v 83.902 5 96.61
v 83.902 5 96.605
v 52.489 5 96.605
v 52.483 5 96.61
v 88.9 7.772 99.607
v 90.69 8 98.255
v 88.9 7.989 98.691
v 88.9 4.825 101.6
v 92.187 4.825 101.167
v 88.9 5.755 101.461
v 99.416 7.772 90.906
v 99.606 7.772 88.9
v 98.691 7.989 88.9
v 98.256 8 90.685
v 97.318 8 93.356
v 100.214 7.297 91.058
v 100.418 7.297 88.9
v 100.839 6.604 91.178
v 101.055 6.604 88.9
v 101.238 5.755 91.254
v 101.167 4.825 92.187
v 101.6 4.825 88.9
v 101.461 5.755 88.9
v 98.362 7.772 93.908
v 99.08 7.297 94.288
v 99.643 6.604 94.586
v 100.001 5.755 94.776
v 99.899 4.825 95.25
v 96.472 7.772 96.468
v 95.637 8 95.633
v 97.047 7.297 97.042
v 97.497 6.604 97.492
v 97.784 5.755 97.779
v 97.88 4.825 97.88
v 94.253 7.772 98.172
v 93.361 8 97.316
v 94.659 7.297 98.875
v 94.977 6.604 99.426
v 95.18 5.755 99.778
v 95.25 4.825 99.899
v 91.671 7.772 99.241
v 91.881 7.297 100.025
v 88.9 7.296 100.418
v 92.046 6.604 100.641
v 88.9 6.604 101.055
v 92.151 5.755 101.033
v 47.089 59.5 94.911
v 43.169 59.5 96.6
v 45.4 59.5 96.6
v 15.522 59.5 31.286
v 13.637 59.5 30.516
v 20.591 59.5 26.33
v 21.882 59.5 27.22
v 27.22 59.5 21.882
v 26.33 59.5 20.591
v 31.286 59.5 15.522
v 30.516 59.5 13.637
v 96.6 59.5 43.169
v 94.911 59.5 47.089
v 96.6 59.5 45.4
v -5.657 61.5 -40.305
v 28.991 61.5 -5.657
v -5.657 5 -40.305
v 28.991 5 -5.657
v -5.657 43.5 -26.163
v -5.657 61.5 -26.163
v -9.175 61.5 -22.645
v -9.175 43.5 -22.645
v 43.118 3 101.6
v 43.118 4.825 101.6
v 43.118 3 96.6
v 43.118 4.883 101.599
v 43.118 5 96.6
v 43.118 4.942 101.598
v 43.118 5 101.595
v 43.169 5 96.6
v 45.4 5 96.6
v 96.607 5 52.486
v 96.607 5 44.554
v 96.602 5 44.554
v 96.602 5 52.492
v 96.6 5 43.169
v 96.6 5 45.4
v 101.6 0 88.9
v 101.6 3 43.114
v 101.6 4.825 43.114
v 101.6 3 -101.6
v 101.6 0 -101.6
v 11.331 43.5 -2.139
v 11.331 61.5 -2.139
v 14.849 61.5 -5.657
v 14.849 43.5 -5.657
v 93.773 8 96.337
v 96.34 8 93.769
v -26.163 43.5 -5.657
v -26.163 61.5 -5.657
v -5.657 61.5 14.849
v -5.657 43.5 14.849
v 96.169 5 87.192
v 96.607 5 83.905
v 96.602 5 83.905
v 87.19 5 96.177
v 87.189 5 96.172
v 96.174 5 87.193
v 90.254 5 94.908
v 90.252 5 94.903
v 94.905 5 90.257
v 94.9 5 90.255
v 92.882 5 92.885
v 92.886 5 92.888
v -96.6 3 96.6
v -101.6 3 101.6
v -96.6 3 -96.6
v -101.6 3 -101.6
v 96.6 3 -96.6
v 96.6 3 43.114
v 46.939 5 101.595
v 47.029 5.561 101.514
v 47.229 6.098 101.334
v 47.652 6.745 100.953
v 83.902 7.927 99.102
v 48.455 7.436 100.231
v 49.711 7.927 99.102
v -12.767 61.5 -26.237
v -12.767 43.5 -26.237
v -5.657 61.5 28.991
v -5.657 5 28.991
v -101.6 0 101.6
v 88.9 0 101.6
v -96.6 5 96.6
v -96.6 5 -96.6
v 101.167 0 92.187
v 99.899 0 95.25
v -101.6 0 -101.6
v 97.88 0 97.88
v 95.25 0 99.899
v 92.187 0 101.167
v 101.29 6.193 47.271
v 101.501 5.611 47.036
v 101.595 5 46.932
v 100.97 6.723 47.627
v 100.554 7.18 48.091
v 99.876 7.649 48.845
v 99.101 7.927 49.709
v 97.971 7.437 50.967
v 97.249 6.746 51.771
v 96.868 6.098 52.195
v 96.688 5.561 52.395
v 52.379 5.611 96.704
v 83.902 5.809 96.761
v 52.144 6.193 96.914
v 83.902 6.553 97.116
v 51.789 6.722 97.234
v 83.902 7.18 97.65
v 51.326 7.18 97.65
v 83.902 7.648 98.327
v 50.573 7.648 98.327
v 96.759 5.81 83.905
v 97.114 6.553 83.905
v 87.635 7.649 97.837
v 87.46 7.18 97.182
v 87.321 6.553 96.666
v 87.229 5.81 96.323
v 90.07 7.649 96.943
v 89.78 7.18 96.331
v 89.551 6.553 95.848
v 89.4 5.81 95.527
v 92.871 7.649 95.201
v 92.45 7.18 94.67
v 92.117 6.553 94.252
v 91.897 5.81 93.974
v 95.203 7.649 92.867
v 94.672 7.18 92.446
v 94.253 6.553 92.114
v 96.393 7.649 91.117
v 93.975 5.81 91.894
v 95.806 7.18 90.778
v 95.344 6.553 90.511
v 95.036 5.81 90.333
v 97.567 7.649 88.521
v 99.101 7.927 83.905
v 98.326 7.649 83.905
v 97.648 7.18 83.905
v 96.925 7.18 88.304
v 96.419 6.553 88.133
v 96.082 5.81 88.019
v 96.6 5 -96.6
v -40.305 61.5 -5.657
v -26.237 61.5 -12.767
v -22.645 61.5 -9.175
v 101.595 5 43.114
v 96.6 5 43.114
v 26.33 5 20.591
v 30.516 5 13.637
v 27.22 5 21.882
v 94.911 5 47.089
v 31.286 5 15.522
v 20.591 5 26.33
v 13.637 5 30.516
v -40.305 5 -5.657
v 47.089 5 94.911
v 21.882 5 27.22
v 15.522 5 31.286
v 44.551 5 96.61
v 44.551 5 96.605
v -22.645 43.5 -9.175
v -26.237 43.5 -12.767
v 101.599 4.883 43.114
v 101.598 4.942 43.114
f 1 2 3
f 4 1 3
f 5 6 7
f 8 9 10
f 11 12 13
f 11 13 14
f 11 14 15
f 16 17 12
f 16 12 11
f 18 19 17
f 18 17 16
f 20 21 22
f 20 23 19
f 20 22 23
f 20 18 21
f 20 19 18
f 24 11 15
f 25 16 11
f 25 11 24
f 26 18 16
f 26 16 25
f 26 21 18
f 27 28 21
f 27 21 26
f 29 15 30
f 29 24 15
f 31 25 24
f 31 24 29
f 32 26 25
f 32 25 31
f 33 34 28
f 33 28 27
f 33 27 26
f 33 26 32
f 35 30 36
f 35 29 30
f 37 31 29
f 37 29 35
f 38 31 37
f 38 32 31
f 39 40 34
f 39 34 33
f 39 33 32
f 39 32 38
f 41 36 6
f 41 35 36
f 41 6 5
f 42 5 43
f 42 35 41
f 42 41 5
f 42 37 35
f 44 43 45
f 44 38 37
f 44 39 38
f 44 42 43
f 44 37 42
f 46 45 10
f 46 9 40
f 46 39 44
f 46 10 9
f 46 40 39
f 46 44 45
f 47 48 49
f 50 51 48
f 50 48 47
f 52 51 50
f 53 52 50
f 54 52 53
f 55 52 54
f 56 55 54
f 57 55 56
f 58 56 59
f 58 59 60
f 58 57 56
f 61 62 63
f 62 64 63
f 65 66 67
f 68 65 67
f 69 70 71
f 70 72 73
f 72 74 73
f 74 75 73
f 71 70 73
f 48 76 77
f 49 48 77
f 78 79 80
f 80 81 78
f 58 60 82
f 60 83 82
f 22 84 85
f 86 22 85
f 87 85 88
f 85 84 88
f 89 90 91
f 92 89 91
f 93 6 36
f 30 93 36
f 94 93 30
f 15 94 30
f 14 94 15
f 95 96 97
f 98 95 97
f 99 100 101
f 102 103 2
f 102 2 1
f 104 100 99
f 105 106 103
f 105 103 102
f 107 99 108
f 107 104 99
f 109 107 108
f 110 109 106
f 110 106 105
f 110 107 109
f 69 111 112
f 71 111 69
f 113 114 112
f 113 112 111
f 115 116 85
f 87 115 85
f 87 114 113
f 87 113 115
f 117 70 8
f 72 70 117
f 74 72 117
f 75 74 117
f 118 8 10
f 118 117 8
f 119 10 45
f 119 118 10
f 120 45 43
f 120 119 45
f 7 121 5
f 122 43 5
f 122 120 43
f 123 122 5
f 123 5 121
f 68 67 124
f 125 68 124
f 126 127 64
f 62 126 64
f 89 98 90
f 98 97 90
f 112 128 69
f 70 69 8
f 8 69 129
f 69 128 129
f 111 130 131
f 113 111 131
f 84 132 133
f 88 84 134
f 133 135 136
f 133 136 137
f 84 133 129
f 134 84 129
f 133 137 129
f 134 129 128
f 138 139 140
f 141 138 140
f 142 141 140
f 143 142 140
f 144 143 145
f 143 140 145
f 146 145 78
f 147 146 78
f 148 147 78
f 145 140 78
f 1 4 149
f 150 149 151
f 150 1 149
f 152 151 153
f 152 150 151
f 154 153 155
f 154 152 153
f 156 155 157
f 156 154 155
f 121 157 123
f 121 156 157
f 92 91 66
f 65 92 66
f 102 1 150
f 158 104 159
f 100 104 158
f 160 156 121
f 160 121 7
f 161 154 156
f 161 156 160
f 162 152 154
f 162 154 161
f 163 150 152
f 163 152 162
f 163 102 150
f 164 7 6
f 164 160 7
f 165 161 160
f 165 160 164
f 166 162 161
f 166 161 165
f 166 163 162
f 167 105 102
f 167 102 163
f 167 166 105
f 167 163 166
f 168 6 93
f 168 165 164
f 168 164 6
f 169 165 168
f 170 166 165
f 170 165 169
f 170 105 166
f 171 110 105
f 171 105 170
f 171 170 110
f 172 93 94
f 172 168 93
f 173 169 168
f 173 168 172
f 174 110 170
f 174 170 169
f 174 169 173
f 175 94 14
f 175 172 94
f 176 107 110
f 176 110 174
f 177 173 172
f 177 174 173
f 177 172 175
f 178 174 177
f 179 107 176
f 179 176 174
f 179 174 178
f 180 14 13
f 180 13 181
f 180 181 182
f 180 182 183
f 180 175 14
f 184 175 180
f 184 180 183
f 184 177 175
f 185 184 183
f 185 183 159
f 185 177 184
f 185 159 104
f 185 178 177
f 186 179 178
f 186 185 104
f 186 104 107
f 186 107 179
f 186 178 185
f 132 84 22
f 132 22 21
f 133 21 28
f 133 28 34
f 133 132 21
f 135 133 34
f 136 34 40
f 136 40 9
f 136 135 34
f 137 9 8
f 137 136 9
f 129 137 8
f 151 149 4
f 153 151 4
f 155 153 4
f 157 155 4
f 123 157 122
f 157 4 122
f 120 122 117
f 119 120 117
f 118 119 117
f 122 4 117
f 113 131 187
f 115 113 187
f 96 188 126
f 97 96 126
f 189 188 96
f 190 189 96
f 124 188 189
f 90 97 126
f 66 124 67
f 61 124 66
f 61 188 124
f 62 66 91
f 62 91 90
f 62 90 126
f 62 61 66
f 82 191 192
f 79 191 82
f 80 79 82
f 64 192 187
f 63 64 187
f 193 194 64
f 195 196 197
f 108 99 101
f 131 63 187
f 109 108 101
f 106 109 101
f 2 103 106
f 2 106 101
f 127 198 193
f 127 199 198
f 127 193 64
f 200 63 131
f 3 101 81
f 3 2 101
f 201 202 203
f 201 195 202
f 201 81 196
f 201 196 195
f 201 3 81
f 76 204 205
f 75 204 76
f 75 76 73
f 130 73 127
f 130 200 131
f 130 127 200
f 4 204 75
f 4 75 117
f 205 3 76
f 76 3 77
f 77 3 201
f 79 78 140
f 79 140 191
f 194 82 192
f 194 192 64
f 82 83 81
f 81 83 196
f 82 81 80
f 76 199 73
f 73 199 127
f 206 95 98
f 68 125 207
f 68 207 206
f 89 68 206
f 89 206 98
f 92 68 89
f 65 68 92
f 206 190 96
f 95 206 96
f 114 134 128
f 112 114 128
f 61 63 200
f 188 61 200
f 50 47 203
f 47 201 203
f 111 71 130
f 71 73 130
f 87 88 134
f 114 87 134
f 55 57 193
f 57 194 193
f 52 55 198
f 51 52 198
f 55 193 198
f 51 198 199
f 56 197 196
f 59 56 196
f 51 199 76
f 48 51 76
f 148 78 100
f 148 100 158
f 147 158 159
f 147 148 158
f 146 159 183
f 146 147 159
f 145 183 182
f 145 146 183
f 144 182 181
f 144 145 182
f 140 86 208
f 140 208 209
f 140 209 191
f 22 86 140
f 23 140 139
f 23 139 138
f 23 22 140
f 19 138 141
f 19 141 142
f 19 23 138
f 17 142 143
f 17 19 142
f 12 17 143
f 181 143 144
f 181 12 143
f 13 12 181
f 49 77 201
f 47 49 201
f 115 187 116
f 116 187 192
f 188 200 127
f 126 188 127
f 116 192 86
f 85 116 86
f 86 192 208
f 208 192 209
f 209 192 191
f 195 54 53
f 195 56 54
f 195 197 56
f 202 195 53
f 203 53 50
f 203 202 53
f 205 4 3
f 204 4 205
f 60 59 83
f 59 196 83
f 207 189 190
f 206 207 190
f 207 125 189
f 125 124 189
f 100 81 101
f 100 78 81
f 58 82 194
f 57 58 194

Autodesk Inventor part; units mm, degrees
ref_plane "YZ Plane" through (0, 0, 0) normal (1, 0, 0) x (0, 1, 0)
ref_plane "XZ Plane" through (0, 0, 0) normal (0, 1, 0) x (-1, 0, 0)
ref_plane "XY Plane" through (0, 0, 0) normal (0, 0, 1) x (1, 0, 0)
sketch "Sketch1" plane through (0, 0, 0) normal (0, 1, 0) x (-1, 0, 0)
  line L0 (101.6, -101.6) -> (-101.6, -101.6)
  line L1 (-101.6, -101.6) -> (-101.6, 101.6)
  line L2 (-101.6, 101.6) -> (101.6, 101.6)
  line L3 (101.6, 101.6) -> (101.6, -101.6)
  line L4 (96.6, -96.6) -> (-96.6, -96.6)
  line L5 (-96.6, -96.6) -> (-96.6, 96.6)
  line L6 (-96.6, 96.6) -> (96.6, 96.6)
  line L7 (96.6, 96.6) -> (96.6, -96.6)
  line L8 (101.6, 101.6) -> (-40.4, 101.6)
  circle A0 centre (0, 0) radius 88.9
  circle A1 centre (0, 0) radius 109.337642
  line L9 (-40.4, 101.6) -> (-101.6, 40.4)
  line L10 (-45.4, 101.6) -> (-101.6, 45.4)
  line L11 (96.6, 96.6) -> (96.6, 101.6)
  line L12 (-45.4, 101.6) -> (-35.4, 101.6)
  line L13 (-35.4, 101.6) -> (-35.4, 96.6)
  line L14 (-35.4, 96.6) -> (-45.4, 96.6)
  line L15 (-45.4, 96.6) -> (-45.4, 101.6)
  line L16 (-45.4, 101.6) -> (-43.114, 101.6)
  line L17 (-43.114, 101.6) -> (-43.114, 96.6)
  line L18 (-43.114, 96.6) -> (-45.4, 96.6)
  line L19 (-45.4, 96.6) -> (-45.4, 101.6)
  line L20 (-96.6, 45.4) -> (-101.6, 45.4)
  line L21 (-101.6, 45.4) -> (-101.6, 43.114)
  line L22 (-101.6, 43.114) -> (-96.6, 43.114)
  line L23 (-96.6, 43.114) -> (-96.6, 45.4)
  point P0 (96.6, 51.216794)
  point P1 (101.6, 40.4)
  point P2 (101.6, -40.4)
  point P3 (96.6, -51.216794)
  point P4 (-96.6, 45.4)
  point P5 (-45.4, 96.6)
  dimension "d0" = 203.2
  dimension "d1" = 203.2
  dimension "d2" = 101.6
  dimension "d3" = 101.6
  dimension "d4" = 5
  dimension "d5" = 5
  dimension "d6" = 5
  dimension "d7" = 5
  dimension "d10" = 142
  dimension "d12" = 61.2
  dimension "d14" = 177.8
  dimension "d15" = 5
  dimension "d16" = 5
  dimension "d17" = 10
  dimension "d86" = 2.286
  dimension "d87" = 2.286
sketch "Sketch1 outline for Extrusion1" plane through (0, 0, 0) normal (0, 1, 0) x (-1, 0, 0)
  line L0 (-101.6, -101.6) -> (101.6, -101.6)
  line L1 (101.6, -101.6) -> (101.6, 101.6)
  line L2 (101.6, 101.6) -> (-101.6, 101.6)
  line L3 (-101.6, 101.6) -> (-101.6, -101.6)
extrude "Extrusion1" add sketch "Sketch1 outline for Extrusion1" along normal blind 5
sketch "Sketch3" plane through (0, 5, 0) normal (0, 1, 0) x (1, 0, 0)
  circle A0 centre (0, 0) radius 88.9
  line L0 (-101.6, 101.6) -> (-101.6, -101.6)
  line L1 (-101.6, -101.6) -> (101.6, -101.6)
  line L2 (-101.6, 101.6) -> (101.6, 101.6)
  line L3 (101.6, 101.6) -> (101.6, -101.6)
  line L4 (101.6, -101.6) -> (-101.6, -101.6)
  line L5 (-101.6, -101.6) -> (-101.6, 101.6)
  line L6 (-96.6, 96.6) -> (96.6, 96.6)
  line L7 (96.6, 96.6) -> (96.6, -96.6)
  line L8 (96.6, -96.6) -> (-96.6, -96.6)
  line L9 (-96.6, -96.6) -> (-96.6, 96.6)
  line L10 (-101.6, -101.6) -> (40.4, -101.6)
  circle A1 centre (0, 0) radius 109.337642
  line L11 (40.4, -101.6) -> (101.6, -40.4)
  line L12 (101.6, -101.6) -> (101.6, 101.6)
  line L13 (45.4038, -101.6) -> (101.6, -45.4038)
  line L14 (96.6, -45.4) -> (101.6, -45.4038)
  line L15 (45.4, -96.6) -> (45.4038, -101.6)
  line L16 (96.6, -45.4) -> (101.6, -45.4)
  line L17 (101.6, -45.4) -> (101.6, -43.114)
  line L18 (101.6, -43.114) -> (96.6, -43.114)
  line L19 (96.6, -43.114) -> (96.6, -45.4)
  line L20 (45.4038, -101.6) -> (43.1178, -101.6)
  line L21 (43.1178, -101.6) -> (43.1178, -96.6)
  line L22 (43.1178, -96.6) -> (45.4038, -96.6)
  line L23 (45.4038, -96.6) -> (45.4038, -101.6)
  point P0 (45.4038, -101.6)
  point P1 (50.4038, -96.6)
  point P2 (96.6, -50.4038)
  dimension "d28" = 177.8
  dimension "d29" = 5
  dimension "d30" = 5
  dimension "d31" = 5
  dimension "d32" = 5
  dimension "d33" = 142
  dimension "d76" = 5.0038
  dimension "d77" = 5.0038
  dimension "d88" = 2.286
  dimension "d89" = 2.286
sketch "Sketch3 outline for Extrusion3" plane through (0, 5, 0) normal (0, 1, 0) x (1, 0, 0)
  line L0 (43.1178, -101.6) -> (43.1178, -96.6)
  line L1 (-101.6, -101.6) -> (43.1178, -101.6)
  line L2 (-101.6, 101.6) -> (-101.6, -101.6)
  line L3 (101.6, 101.6) -> (-101.6, 101.6)
  line L4 (101.6, -43.114) -> (101.6, 101.6)
  line L5 (96.6, -43.114) -> (101.6, -43.114)
  line L6 (96.6, 96.6) -> (96.6, -43.114)
  line L7 (-96.6, 96.6) -> (96.6, 96.6)
  line L8 (-96.6, -96.6) -> (-96.6, 96.6)
  line L9 (43.1178, -96.6) -> (-96.6, -96.6)
extrude "Extrusion3" cut sketch "Sketch3 outline for Extrusion3" against normal blind 2
sketch "Sketch4" plane through (0, 5, 0) normal (0, 1, 0) x (1, 0, 0)
  line L0 (101.6, 101.6) -> (-101.6, 101.6)
  line L1 (-101.6, 101.6) -> (-101.6, -101.6)
  line L2 (-101.6, -101.6) -> (101.6, -101.6)
  line L3 (101.6, -101.6) -> (101.6, 101.6)
  circle A0 centre (0, 0) radius 2.5
  line L4 (11.331386, 2.138998) -> (-2.138998, -11.331386)
  line L5 (0, 0) -> (-5.656854, 5.656854)
  line L6 (-5.656854, -14.849242) -> (-26.162951, 5.656855)
  line L7 (-5.656854, 26.162952) -> (14.849242, 5.656855)
  circle A1 centre (-5.656854, 5.656854) radius 14
  line L8 (-26.162951, 5.656855) -> (-5.656854, 26.162952)
  line L9 (14.849242, 5.656855) -> (-5.656854, -14.849242)
  line L10 (-40.305087, 5.656855) -> (-5.656854, 40.305087)
  line L11 (-5.656854, 40.305087) -> (28.991378, 5.656855)
  line L12 (28.991378, 5.656855) -> (-5.656854, -28.991377)
  line L13 (-5.656854, -28.991377) -> (-40.305087, 5.656855)
  line L14 (-22.645095, 9.174711) -> (-9.174711, 22.645095)
  line L15 (-9.174711, 22.645095) -> (-12.766813, 26.237197)
  line L16 (-12.766813, 26.237197) -> (-26.237197, 12.766813)
  line L17 (-26.237197, 12.766813) -> (-22.645095, 9.174711)
  point P0 (9.525, 22.5)
  point P1 (-9.525, -6.5)
  dimension "d37" = 203.2
  dimension "d38" = 203.2
  dimension "d39" = 8
  dimension "d40" = 28
  dimension "d41" = 29
  dimension "d42" = 29
  dimension "d43" = 14.5
  dimension "d44" = 10
  dimension "d45" = 10
  dimension "d46" = 10
  dimension "d47" = 10
  dimension "d48" = 5.08
  dimension "d49" = 9.525
  dimension "d50" = 9.525
  dimension "d55" = 101.6
  dimension "d56" = 101.6
sketch "Sketch4 outline for Extrusion4" plane through (0, 5, 0) normal (0, 1, 0) x (1, 0, 0)
  line L0 (-40.305087, 5.656855) -> (-5.656854, -28.991377)
  line L1 (-5.656854, 40.305087) -> (-40.305087, 5.656855)
  line L2 (28.991378, 5.656855) -> (-5.656854, 40.305087)
  line L3 (-5.656854, -28.991377) -> (28.991378, 5.656855)
extrude "Extrusion4" add sketch "Sketch4 outline for Extrusion4" along normal blind 56.5
sketch "Sketch5" plane through (0, 61.5, 0) normal (0, 1, 0) x (1, 0, 0)
  circle A0 centre (0, 0) radius 2.5
  line L0 (11.331386, 2.138998) -> (-2.138998, -11.331386)
  line L1 (0, 0) -> (-5.656854, 5.656854)
  line L2 (-5.656854, -14.849242) -> (-26.162951, 5.656855)
  line L3 (-5.656854, 26.162952) -> (14.849242, 5.656855)
  circle A1 centre (-5.656854, 5.656854) radius 14
  line L4 (-26.162951, 5.656855) -> (-5.656854, 26.162952)
  line L5 (14.849242, 5.656855) -> (-5.656854, -14.849242)
  line L6 (-40.305087, 5.656855) -> (-5.656854, 40.305087)
  line L7 (-5.656854, 40.305087) -> (28.991378, 5.656855)
  line L8 (28.991378, 5.656855) -> (-5.656854, -28.991377)
  line L9 (-5.656854, -28.991377) -> (-40.305087, 5.656855)
  line L10 (-22.645095, 9.174711) -> (-9.174711, 22.645095)
  line L11 (-9.174711, 22.645095) -> (-12.766813, 26.237197)
  line L12 (-12.766813, 26.237197) -> (-26.237197, 12.766813)
  line L13 (-26.237197, 12.766813) -> (-22.645095, 9.174711)
  point P0 (-2.138998, -11.331386)
  point P1 (-9.174711, 22.645095)
  dimension "d57" = 8
  dimension "d58" = 28
  dimension "d59" = 29
  dimension "d60" = 29
  dimension "d61" = 14.5
  dimension "d62" = 10
  dimension "d63" = 10
  dimension "d64" = 10
  dimension "d65" = 10
  dimension "d66" = 5.08
  dimension "d67" = 9.525
  dimension "d68" = 9.525
sketch "Sketch5 outline for Extrusion5" plane through (0, 61.5, 0) normal (0, 1, 0) x (1, 0, 0)
  line L0 (-26.162951, 5.656855) -> (-5.656854, -14.849242)
  line L1 (-22.645095, 9.174711) -> (-26.162951, 5.656855)
  line L2 (-26.237197, 12.766813) -> (-22.645095, 9.174711)
  line L3 (-12.766813, 26.237197) -> (-26.237197, 12.766813)
  line L4 (-9.174711, 22.645095) -> (-12.766813, 26.237197)
  line L5 (-5.656854, 26.162952) -> (-9.174711, 22.645095)
  line L6 (14.849242, 5.656855) -> (-5.656854, 26.162952)
  line L7 (11.331386, 2.138998) -> (14.849242, 5.656855)
  line L8 (-2.138998, -11.331386) -> (11.331386, 2.138998)
  line L9 (-5.656854, -14.849242) -> (-2.138998, -11.331386)
extrude "Extrusion5" cut sketch "Sketch5 outline for Extrusion5" against normal blind 18
sketch "Sketch6" plane through (0, 5, 0) normal (0, 1, 0) x (1, 0, 0)
  line L0 (45.4038, -101.6) -> (0, 0)
  line L1 (50.4038, -96.6) -> (45.4038, -101.6)
  line L2 (96.6, -43.114) -> (96.6, 96.6)
  line L3 (101.6, -101.6) -> (101.6, 101.6)
  circle A0 centre (0, 0) radius 34.925
  circle A1 centre (0, 0) radius 33.425
  line L4 (-101.6, 101.6) -> (-101.6, -101.6)
  line L5 (-101.6, -101.6) -> (40.4, -101.6)
  line L6 (-101.6, -101.6) -> (101.6, -101.6)
  line L7 (101.6, 101.6) -> (101.6, -43.114)
  line L8 (101.6, -45.4038) -> (0, 0)
  line L9 (-96.6, -96.6) -> (43.1178, -96.6)
  line L10 (96.6, -43.114) -> (96.6, 96.6)
  line L11 (43.1178, -101.6) -> (-101.6, -101.6)
  line L12 (101.6, -45.4038) -> (96.6, -50.4038)
  line L13 (45.4038, -101.6) -> (101.6, -45.4038)
  line L14 (43.1178, -101.6) -> (101.6, -101.6)
  line L15 (0, 0) -> (101.6, -50.4076)
  line L16 (50.4076, -101.6) -> (0, 0)
  line L17 (43.169361, -96.6) -> (47.926911, -96.6)
  line L18 (96.6, -43.169361) -> (96.6, -47.926911)
  line L19 (40.4, -101.6) -> (101.6, -40.4)
  point P0 (13.637413, -30.516415)
  point P1 (30.516415, -13.637413)
  point P2 (14.249414, -31.885888)
  point P3 (31.286053, -15.522194)
  point P4 (29.942343, -14.855528)
  point P5 (31.885888, -14.249414)
  point P6 (98.255522, -48.748278)
  point P7 (96.6, -47.926911)
  point P8 (47.926911, -96.6)
  point P9 (15.522194, -31.286053)
  point P10 (96.6, -45.4)
  point P11 (45.4, -96.6)
  point P12 (14.855528, -29.942343)
  point P13 (96.6, -45.4)
  point P14 (45.4, -96.6)
  point P15 (45.4, -96.6)
  point P16 (47.088956, -94.911044)
  point P17 (94.911044, -47.088956)
  point P18 (96.6, -45.4)
  point P19 (43.858319, -98.141681)
  point P20 (98.141681, -43.858319)
  point P21 (45.4, -96.6)
  point P22 (96.6, -45.4)
  dimension "d71" = 69.85
  dimension "d72" = 66.85
  dimension "d75" = 142
  dimension "d78" = 5.0038
  dimension "d82" = 5.0038
sketch "Sketch6 outline for Extrusion6" plane through (0, 5, 0) normal (0, 1, 0) x (1, 0, 0)
  line L0 (45.4, -96.6) -> (47.088956, -94.911044)
  line L1 (43.169361, -96.6) -> (45.4, -96.6)
  line L2 (13.637413, -30.516415) -> (43.169361, -96.6)
  arc A0 (30.516415, -13.637413) -> (13.637413, -30.516415) centre (0, 0) cw
  line L3 (96.6, -43.169361) -> (30.516415, -13.637413)
  line L4 (96.6, -45.4) -> (96.6, -43.169361)
  line L5 (94.911044, -47.088956) -> (96.6, -45.4)
  line L6 (31.286053, -15.522194) -> (94.911044, -47.088956)
  arc A1 (15.522194, -31.286053) -> (31.286053, -15.522194) centre (0, 0) ccw
  line L7 (47.088956, -94.911044) -> (15.522194, -31.286053)
extrude "Extrusion6" add sketch "Sketch6 outline for Extrusion6" along normal blind 54.5
sketch "Sketch8" plane through (0, 5, 0) normal (0, 1, 0) x (1, 0, 0)
  line L0 (101.6, -101.6) -> (101.6, 101.6)
  line L1 (-96.6, -96.6) -> (43.1178, -96.6)
  line L2 (101.6, -101.6) -> (43.1178, -101.6)
  line L3 (43.1178, -101.6) -> (43.1178, -96.6)
  line L4 (43.1178, -96.6) -> (101.6, -96.6)
  line L5 (101.6, -96.6) -> (101.6, -101.6)
  line L6 (96.6, -43.114) -> (96.6, 96.6)
  line L7 (101.6, -101.6) -> (96.6, -101.6)
  line L8 (96.6, -101.6) -> (96.6, -43.114)
  line L9 (96.6, -43.114) -> (101.6, -43.114)
  line L10 (101.6, -43.114) -> (101.6, -101.6)
  line L11 (96.6, -45.4) -> (94.911044, -47.088956)
  line L12 (47.088956, -94.911044) -> (15.522194, -31.286053)
  line L13 (43.1178, -101.6) -> (101.6, -101.6)
  line L14 (43.1178, -101.6) -> (-101.6, -101.6)
  line L15 (-101.6, -101.6) -> (40.4, -101.6)
  line L16 (101.601962, -101.604818) -> (-101.598038, -101.604818)
  line L17 (-101.598038, -101.604818) -> (-101.598038, 101.595182)
  line L18 (-101.598038, 101.595182) -> (101.601962, 101.595182)
  line L19 (101.601962, 101.595182) -> (101.601962, -101.604818)
  line L20 (96.601962, -96.604818) -> (-96.598038, -96.604818)
  line L21 (-96.598038, -96.604818) -> (-96.598038, 96.595182)
  line L22 (-96.598038, 96.595182) -> (96.601962, 96.595182)
  line L23 (96.601962, 96.595182) -> (96.601962, -96.604818)
  line L24 (101.601962, 101.595182) -> (-40.398038, 101.595182)
  circle A0 centre (0.001962, -0.004818) radius 88.9
  circle A1 centre (0.001962, -0.004818) radius 109.337642
  line L25 (-40.398038, 101.595182) -> (-101.598038, 40.395182)
  line L26 (-45.398038, 101.595182) -> (-101.598038, 45.395182)
  line L27 (96.601962, 96.595182) -> (96.601962, 101.595182)
  line L28 (-45.398038, 101.595182) -> (-35.398038, 101.595182)
  line L29 (-35.398038, 101.595182) -> (-35.398038, 96.595182)
  line L30 (-35.398038, 96.595182) -> (-45.398038, 96.595182)
  line L31 (-45.398038, 96.595182) -> (-45.398038, 101.595182)
  line L32 (43.1178, -96.6) -> (43.1178, -101.6)
  line L33 (43.1178, -100.4824) -> (43.1178, -101.6)
  line L34 (51.218756, -96.604818) -> (52.336356, -96.604818)
  line L35 (100.4824, -43.114) -> (101.6, -43.114)
  line L36 (96.601962, -51.221612) -> (96.601962, -52.339212)
  line L37 (43.1178, -101.6) -> (46.927797, -101.604818)
  line L38 (101.6, -43.114) -> (101.601962, -46.923999)
  line L39 (101.601962, -46.923999) -> (96.601962, -52.491612)
  line L40 (96.601962, -51.221612) -> (96.601962, -54.317383)
  line L41 (46.927797, -101.604818) -> (52.488756, -96.604818)
  line L42 (51.218756, -96.604818) -> (52.488756, -96.604818)
  point P0 (0, 0)
  point P1 (-96.598038, -96.6)
  point P2 (43.1178, -96.604818)
  point P3 (101.6, -46.926184)
  point P4 (46.933155, -101.6)
  dimension "d93" = 142
  dimension "d94" = 203.2
  dimension "d95" = 203.2
  dimension "d96" = 101.6
  dimension "d97" = 101.6
  dimension "d98" = 5
  dimension "d99" = 5
  dimension "d100" = 5
  dimension "d101" = 5
  dimension "d102" = 142
  dimension "d103" = 61.2
  dimension "d104" = 177.8
  dimension "d105" = 5
  dimension "d106" = 5
  dimension "d107" = 10
  dimension "d116" = 3.81
  dimension "d117" = 3.81
  dimension "d118" = 1.27
  dimension "d119" = 1.27
sketch "Sketch8 outline for Extrusion7" plane through (0, 5, 0) normal (0, 1, 0) x (1, 0, 0)
  line L0 (101.6, -46.926184) -> (96.601962, -52.491612)
  line L1 (101.6, -101.6) -> (101.6, -46.926184)
  line L2 (46.933155, -101.6) -> (101.6, -101.6)
  line L3 (52.488756, -96.604818) -> (46.933155, -101.6)
  line L4 (96.601962, -96.604818) -> (52.488756, -96.604818)
  line L5 (96.601962, -52.491612) -> (96.601962, -96.604818)
extrude "Extrusion7" add sketch "Sketch8 outline for Extrusion7" along normal blind 3
fillet "Fillet3" radius 12.7 2 edges at (101.6, 4, 101.6) (96.602, 6.5, 96.6048)
fillet "Fillet4" radius 3.175 6 edges at (97.8803, 8, 97.8803) (101.6, 8, 67.9131) (67.9166, 8, 101.6) (92.8822, 8, 92.8851) (96.602, 8, 68.1982) (68.1954, 8, 96.6048)
sketch "Sketch9" plane through (0, 61.5, 0) normal (0, 1, 0) x (1, 0, 0)
  point P0 (0, 0)
sketch "Sketch10" plane through (0, 5, 0) normal (0, 1, 0) x (1, 0, 0)
  point P0 (0, 0)
equation "\"d1\" = d0"
equation "\"d2\" = 0.5 * d0"
equation "\"d3\" = 0.5 * d0"
equation "\"d95\" = d94"
equation "\"d96\" = 0.5 * d94"
equation "\"d97\" = 0.5 * d94"
properties part number "Box_Walls_2"
